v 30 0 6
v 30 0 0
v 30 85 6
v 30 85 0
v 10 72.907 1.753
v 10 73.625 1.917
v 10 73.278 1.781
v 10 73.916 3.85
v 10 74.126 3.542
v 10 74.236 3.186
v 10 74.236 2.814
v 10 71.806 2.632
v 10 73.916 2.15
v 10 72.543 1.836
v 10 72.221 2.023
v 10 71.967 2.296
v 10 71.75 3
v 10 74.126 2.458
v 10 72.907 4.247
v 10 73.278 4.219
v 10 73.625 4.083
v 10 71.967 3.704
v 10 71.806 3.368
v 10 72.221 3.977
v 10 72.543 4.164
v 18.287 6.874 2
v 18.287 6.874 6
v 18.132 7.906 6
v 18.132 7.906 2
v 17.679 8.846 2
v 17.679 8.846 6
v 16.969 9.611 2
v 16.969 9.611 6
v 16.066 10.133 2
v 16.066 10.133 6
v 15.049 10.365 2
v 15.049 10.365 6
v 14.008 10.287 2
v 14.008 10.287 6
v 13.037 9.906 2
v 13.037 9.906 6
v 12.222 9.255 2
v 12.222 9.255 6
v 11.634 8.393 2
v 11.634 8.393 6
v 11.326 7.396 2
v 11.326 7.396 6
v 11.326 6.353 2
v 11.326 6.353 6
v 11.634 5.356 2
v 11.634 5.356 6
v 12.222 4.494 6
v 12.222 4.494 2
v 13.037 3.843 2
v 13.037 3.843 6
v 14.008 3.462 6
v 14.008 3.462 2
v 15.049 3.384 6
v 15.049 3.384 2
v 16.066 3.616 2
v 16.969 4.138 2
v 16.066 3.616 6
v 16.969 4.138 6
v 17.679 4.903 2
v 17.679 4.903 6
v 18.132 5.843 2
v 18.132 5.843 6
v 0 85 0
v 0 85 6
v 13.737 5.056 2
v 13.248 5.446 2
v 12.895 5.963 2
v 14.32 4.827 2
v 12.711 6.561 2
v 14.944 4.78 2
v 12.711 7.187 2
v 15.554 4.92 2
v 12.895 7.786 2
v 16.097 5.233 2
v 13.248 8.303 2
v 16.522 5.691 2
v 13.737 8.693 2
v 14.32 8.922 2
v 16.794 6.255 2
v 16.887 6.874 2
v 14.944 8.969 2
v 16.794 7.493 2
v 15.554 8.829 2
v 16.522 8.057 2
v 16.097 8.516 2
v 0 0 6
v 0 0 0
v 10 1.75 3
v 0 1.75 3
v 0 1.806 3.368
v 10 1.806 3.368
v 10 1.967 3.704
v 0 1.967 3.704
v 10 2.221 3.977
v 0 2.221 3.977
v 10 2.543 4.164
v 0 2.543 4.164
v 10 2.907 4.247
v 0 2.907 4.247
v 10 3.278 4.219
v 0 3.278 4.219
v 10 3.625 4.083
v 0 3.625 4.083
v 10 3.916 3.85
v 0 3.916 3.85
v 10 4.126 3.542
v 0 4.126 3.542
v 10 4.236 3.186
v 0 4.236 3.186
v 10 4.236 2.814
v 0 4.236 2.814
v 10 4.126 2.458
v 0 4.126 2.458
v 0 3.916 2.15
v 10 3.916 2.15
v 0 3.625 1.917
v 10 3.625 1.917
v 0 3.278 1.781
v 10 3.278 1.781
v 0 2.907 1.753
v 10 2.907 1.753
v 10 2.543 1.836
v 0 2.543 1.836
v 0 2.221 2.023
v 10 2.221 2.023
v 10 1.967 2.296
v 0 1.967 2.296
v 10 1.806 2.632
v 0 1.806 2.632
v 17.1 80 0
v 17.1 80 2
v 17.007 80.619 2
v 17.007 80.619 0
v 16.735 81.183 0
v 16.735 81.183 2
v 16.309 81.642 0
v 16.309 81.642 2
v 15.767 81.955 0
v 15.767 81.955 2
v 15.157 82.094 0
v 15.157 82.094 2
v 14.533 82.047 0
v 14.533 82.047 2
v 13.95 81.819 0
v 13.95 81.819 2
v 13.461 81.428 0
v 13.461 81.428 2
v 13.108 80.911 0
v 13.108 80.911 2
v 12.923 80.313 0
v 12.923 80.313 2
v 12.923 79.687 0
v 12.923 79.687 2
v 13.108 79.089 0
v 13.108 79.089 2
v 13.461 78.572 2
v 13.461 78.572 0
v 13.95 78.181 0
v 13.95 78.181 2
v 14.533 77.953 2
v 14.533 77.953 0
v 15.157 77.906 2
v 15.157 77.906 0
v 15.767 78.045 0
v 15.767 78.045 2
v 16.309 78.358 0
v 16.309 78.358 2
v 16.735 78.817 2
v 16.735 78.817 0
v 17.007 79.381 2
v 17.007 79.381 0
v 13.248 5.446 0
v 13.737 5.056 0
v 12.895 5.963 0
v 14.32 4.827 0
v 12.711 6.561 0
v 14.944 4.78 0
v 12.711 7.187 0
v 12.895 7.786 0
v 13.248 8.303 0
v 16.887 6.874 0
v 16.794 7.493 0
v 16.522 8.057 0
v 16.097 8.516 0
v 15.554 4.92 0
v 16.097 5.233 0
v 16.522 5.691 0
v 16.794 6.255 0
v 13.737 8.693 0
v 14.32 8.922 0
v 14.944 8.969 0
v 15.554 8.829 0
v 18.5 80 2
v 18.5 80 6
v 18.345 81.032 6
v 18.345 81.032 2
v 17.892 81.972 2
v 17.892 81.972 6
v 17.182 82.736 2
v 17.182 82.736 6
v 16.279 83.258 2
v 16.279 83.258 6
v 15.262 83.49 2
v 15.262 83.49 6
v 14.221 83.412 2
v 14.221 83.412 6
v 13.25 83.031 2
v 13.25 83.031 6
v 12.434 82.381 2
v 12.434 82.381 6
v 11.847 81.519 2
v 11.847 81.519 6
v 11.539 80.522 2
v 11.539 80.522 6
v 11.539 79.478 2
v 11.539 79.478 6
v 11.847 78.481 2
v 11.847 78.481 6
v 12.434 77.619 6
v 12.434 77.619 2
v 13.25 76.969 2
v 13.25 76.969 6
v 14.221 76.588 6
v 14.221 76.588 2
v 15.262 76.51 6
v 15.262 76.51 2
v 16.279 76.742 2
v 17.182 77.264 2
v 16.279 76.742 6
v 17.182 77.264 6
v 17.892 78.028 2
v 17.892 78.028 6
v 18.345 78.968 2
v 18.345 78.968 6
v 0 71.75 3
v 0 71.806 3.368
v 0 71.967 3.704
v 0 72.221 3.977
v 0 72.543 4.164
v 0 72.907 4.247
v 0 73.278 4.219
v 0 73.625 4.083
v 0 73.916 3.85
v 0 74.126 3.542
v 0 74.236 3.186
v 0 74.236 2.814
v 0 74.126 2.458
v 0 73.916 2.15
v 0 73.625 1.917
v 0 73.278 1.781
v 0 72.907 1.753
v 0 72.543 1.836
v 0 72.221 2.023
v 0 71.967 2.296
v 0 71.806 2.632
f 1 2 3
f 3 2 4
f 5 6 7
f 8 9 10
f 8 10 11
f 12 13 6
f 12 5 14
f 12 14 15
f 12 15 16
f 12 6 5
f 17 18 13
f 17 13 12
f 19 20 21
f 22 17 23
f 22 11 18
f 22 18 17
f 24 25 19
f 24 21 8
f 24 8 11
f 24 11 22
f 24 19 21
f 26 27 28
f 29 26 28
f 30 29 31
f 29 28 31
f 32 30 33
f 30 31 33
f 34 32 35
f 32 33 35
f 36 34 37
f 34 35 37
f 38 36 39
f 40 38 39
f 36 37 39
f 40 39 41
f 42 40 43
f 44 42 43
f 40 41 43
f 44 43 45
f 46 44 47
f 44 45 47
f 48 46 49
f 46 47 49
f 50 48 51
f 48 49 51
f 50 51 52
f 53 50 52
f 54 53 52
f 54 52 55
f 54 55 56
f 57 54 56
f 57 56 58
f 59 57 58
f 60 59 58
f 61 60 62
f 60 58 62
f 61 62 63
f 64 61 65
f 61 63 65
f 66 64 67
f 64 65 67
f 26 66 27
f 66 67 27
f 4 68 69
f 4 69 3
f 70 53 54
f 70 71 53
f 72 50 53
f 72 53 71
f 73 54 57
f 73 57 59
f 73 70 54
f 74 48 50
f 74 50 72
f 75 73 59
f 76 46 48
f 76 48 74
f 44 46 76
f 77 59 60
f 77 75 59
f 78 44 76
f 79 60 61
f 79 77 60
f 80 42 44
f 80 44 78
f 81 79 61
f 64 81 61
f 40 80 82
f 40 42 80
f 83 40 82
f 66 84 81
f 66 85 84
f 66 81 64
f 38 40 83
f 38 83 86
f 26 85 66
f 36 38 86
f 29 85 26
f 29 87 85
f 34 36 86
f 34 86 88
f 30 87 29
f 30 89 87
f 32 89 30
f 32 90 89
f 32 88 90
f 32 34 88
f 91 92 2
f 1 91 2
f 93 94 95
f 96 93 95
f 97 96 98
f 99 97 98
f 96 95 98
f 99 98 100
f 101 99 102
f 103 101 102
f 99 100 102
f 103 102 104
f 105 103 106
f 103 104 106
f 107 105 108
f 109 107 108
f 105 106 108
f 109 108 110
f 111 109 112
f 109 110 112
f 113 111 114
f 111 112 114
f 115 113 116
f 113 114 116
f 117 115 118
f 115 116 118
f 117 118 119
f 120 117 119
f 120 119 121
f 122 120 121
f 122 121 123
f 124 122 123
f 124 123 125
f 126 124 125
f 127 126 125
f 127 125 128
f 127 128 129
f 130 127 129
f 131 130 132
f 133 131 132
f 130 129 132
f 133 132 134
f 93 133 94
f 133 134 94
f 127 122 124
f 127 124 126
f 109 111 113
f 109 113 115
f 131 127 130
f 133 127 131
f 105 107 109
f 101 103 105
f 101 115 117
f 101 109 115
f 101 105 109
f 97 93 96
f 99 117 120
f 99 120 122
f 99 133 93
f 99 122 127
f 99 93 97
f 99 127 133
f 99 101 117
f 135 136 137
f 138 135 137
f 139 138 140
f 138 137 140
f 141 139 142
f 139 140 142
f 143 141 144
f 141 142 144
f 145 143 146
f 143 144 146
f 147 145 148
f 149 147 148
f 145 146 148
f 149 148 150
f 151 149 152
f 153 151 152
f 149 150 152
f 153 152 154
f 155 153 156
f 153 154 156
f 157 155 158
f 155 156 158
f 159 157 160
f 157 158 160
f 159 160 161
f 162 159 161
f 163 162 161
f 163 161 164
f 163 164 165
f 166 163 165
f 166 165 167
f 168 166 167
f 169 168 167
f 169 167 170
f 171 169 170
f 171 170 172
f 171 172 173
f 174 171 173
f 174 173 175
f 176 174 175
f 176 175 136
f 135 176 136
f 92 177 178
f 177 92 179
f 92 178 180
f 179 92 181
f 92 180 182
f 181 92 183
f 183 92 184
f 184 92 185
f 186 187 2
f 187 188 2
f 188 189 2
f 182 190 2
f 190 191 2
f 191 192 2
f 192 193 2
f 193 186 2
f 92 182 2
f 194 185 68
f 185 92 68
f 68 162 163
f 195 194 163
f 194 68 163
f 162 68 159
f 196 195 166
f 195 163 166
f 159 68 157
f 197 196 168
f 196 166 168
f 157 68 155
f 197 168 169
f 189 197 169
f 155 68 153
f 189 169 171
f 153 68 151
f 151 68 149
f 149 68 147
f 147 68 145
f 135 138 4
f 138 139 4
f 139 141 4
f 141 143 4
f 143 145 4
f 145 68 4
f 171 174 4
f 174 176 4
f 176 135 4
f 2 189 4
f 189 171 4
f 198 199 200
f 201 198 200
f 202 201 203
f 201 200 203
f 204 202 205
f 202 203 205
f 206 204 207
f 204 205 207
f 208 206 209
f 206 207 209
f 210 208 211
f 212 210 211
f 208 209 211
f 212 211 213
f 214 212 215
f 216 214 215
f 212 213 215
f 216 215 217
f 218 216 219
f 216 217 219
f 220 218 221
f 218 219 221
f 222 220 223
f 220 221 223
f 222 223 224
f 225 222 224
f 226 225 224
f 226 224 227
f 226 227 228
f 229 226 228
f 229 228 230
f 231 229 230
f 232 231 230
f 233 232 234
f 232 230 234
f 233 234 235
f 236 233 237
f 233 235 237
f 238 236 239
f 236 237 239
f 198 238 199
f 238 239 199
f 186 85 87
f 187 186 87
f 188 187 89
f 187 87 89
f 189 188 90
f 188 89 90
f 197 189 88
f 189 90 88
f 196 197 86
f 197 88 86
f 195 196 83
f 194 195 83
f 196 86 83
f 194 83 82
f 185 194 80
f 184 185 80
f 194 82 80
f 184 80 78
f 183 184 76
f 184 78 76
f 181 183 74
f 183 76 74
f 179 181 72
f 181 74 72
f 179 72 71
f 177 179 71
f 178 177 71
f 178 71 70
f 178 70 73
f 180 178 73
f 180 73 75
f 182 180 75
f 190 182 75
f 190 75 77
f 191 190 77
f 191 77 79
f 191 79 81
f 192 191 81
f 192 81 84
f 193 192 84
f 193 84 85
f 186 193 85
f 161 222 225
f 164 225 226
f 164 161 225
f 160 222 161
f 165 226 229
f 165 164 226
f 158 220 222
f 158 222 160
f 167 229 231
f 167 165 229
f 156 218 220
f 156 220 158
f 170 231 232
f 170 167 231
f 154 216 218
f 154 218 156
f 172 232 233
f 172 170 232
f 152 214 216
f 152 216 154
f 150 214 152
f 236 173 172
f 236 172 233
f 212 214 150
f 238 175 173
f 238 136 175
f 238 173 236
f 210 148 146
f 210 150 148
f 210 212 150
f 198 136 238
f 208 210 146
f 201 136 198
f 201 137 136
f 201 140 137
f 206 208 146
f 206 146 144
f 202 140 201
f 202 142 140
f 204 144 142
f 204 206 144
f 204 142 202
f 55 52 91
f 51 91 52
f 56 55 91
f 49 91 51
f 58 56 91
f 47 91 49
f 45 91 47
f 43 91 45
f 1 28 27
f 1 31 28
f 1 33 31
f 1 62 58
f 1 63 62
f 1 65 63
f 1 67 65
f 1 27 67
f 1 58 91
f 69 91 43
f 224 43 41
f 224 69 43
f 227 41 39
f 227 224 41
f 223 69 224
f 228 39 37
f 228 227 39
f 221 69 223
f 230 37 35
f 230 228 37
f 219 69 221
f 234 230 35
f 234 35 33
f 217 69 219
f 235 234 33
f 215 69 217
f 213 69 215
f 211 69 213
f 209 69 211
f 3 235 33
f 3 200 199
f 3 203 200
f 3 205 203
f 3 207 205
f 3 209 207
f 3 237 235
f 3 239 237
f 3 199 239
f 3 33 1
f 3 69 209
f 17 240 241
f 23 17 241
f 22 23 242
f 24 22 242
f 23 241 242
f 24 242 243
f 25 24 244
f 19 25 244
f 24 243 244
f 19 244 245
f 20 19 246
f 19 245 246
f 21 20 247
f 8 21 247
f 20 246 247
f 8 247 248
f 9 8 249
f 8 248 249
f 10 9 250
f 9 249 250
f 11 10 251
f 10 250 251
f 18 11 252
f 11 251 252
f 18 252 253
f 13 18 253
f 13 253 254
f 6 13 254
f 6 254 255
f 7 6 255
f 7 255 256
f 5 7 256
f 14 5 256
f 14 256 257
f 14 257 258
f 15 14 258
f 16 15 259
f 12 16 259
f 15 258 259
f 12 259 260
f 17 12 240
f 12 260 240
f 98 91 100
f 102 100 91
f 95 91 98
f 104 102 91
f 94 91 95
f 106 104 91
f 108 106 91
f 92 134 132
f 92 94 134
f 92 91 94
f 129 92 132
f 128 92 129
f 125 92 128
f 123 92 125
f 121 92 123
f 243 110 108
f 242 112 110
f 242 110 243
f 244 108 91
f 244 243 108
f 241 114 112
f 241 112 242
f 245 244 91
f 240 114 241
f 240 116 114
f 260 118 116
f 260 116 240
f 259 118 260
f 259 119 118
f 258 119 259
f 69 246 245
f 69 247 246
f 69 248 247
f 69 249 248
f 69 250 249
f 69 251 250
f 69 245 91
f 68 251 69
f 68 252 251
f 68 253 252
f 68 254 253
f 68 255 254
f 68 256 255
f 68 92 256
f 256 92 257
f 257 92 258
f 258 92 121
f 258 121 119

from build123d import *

# Parameters (mm, degrees)
F0_W      = 30
F0_H      = 85
F1_DEPTH  = 6
F2_R      = 3.5
F3_DEPTH  = 4
F4_R      = 2.1
F5_DEPTH  = 25
F6_R      = 3.5
F7_DEPTH  = 4
F8_R      = 2.1
F9_DEPTH  = 25
F11_R     = 1.25
F12_DEPTH = 10
F10_R     = 1.25
F13_DEPTH = 10


with BuildPart() as f1:
    # F0 (on Top) → F1 (new body)
    with BuildSketch(Plane.XY):
        with Locations((15, 42.5)):
            Rectangle(F0_W, F0_H)
    extrude(amount=F1_DEPTH)

    # F2 (on face) → F3 (cut)
    with BuildSketch(Plane.XY.offset(6)):
        with Locations((15, 80)):
            Circle(F2_R)
    extrude(amount=-F3_DEPTH, mode=Mode.SUBTRACT)

    # F4 (on face) → F5 (cut)
    with BuildSketch(Plane.XY.offset(2)):
        with Locations((15, 80)):
            Circle(F4_R)
    extrude(amount=-F5_DEPTH, mode=Mode.SUBTRACT)

    # F6 (on face) → F7 (cut)
    with BuildSketch(Plane.XY.offset(6)):
        with Locations((14.787185, 6.874469)):
            Circle(F6_R)
    extrude(amount=-F7_DEPTH, mode=Mode.SUBTRACT)

    # F8 (on face) → F9 (cut)
    with BuildSketch(Plane.XY.offset(2)):
        with Locations((14.787185, 6.874469)):
            Circle(F8_R)
    extrude(amount=-F9_DEPTH, mode=Mode.SUBTRACT)

    # F11 (on face) → F12 (cut)
    with BuildSketch(Plane(origin=(0, 0, 0), x_dir=(0, -1, 0), z_dir=(-1, 0, 0))):
        with Locations((-73, 3)):
            Circle(F11_R)
    extrude(amount=-F12_DEPTH, mode=Mode.SUBTRACT)

    # F10 (on face) → F13 (cut)
    with BuildSketch(Plane(origin=(0, 0, 0), x_dir=(0, -1, 0), z_dir=(-1, 0, 0))):
        with Locations((-3, 3)):
            Circle(F10_R)
    extrude(amount=-F13_DEPTH, mode=Mode.SUBTRACT)


solid = f1.part
